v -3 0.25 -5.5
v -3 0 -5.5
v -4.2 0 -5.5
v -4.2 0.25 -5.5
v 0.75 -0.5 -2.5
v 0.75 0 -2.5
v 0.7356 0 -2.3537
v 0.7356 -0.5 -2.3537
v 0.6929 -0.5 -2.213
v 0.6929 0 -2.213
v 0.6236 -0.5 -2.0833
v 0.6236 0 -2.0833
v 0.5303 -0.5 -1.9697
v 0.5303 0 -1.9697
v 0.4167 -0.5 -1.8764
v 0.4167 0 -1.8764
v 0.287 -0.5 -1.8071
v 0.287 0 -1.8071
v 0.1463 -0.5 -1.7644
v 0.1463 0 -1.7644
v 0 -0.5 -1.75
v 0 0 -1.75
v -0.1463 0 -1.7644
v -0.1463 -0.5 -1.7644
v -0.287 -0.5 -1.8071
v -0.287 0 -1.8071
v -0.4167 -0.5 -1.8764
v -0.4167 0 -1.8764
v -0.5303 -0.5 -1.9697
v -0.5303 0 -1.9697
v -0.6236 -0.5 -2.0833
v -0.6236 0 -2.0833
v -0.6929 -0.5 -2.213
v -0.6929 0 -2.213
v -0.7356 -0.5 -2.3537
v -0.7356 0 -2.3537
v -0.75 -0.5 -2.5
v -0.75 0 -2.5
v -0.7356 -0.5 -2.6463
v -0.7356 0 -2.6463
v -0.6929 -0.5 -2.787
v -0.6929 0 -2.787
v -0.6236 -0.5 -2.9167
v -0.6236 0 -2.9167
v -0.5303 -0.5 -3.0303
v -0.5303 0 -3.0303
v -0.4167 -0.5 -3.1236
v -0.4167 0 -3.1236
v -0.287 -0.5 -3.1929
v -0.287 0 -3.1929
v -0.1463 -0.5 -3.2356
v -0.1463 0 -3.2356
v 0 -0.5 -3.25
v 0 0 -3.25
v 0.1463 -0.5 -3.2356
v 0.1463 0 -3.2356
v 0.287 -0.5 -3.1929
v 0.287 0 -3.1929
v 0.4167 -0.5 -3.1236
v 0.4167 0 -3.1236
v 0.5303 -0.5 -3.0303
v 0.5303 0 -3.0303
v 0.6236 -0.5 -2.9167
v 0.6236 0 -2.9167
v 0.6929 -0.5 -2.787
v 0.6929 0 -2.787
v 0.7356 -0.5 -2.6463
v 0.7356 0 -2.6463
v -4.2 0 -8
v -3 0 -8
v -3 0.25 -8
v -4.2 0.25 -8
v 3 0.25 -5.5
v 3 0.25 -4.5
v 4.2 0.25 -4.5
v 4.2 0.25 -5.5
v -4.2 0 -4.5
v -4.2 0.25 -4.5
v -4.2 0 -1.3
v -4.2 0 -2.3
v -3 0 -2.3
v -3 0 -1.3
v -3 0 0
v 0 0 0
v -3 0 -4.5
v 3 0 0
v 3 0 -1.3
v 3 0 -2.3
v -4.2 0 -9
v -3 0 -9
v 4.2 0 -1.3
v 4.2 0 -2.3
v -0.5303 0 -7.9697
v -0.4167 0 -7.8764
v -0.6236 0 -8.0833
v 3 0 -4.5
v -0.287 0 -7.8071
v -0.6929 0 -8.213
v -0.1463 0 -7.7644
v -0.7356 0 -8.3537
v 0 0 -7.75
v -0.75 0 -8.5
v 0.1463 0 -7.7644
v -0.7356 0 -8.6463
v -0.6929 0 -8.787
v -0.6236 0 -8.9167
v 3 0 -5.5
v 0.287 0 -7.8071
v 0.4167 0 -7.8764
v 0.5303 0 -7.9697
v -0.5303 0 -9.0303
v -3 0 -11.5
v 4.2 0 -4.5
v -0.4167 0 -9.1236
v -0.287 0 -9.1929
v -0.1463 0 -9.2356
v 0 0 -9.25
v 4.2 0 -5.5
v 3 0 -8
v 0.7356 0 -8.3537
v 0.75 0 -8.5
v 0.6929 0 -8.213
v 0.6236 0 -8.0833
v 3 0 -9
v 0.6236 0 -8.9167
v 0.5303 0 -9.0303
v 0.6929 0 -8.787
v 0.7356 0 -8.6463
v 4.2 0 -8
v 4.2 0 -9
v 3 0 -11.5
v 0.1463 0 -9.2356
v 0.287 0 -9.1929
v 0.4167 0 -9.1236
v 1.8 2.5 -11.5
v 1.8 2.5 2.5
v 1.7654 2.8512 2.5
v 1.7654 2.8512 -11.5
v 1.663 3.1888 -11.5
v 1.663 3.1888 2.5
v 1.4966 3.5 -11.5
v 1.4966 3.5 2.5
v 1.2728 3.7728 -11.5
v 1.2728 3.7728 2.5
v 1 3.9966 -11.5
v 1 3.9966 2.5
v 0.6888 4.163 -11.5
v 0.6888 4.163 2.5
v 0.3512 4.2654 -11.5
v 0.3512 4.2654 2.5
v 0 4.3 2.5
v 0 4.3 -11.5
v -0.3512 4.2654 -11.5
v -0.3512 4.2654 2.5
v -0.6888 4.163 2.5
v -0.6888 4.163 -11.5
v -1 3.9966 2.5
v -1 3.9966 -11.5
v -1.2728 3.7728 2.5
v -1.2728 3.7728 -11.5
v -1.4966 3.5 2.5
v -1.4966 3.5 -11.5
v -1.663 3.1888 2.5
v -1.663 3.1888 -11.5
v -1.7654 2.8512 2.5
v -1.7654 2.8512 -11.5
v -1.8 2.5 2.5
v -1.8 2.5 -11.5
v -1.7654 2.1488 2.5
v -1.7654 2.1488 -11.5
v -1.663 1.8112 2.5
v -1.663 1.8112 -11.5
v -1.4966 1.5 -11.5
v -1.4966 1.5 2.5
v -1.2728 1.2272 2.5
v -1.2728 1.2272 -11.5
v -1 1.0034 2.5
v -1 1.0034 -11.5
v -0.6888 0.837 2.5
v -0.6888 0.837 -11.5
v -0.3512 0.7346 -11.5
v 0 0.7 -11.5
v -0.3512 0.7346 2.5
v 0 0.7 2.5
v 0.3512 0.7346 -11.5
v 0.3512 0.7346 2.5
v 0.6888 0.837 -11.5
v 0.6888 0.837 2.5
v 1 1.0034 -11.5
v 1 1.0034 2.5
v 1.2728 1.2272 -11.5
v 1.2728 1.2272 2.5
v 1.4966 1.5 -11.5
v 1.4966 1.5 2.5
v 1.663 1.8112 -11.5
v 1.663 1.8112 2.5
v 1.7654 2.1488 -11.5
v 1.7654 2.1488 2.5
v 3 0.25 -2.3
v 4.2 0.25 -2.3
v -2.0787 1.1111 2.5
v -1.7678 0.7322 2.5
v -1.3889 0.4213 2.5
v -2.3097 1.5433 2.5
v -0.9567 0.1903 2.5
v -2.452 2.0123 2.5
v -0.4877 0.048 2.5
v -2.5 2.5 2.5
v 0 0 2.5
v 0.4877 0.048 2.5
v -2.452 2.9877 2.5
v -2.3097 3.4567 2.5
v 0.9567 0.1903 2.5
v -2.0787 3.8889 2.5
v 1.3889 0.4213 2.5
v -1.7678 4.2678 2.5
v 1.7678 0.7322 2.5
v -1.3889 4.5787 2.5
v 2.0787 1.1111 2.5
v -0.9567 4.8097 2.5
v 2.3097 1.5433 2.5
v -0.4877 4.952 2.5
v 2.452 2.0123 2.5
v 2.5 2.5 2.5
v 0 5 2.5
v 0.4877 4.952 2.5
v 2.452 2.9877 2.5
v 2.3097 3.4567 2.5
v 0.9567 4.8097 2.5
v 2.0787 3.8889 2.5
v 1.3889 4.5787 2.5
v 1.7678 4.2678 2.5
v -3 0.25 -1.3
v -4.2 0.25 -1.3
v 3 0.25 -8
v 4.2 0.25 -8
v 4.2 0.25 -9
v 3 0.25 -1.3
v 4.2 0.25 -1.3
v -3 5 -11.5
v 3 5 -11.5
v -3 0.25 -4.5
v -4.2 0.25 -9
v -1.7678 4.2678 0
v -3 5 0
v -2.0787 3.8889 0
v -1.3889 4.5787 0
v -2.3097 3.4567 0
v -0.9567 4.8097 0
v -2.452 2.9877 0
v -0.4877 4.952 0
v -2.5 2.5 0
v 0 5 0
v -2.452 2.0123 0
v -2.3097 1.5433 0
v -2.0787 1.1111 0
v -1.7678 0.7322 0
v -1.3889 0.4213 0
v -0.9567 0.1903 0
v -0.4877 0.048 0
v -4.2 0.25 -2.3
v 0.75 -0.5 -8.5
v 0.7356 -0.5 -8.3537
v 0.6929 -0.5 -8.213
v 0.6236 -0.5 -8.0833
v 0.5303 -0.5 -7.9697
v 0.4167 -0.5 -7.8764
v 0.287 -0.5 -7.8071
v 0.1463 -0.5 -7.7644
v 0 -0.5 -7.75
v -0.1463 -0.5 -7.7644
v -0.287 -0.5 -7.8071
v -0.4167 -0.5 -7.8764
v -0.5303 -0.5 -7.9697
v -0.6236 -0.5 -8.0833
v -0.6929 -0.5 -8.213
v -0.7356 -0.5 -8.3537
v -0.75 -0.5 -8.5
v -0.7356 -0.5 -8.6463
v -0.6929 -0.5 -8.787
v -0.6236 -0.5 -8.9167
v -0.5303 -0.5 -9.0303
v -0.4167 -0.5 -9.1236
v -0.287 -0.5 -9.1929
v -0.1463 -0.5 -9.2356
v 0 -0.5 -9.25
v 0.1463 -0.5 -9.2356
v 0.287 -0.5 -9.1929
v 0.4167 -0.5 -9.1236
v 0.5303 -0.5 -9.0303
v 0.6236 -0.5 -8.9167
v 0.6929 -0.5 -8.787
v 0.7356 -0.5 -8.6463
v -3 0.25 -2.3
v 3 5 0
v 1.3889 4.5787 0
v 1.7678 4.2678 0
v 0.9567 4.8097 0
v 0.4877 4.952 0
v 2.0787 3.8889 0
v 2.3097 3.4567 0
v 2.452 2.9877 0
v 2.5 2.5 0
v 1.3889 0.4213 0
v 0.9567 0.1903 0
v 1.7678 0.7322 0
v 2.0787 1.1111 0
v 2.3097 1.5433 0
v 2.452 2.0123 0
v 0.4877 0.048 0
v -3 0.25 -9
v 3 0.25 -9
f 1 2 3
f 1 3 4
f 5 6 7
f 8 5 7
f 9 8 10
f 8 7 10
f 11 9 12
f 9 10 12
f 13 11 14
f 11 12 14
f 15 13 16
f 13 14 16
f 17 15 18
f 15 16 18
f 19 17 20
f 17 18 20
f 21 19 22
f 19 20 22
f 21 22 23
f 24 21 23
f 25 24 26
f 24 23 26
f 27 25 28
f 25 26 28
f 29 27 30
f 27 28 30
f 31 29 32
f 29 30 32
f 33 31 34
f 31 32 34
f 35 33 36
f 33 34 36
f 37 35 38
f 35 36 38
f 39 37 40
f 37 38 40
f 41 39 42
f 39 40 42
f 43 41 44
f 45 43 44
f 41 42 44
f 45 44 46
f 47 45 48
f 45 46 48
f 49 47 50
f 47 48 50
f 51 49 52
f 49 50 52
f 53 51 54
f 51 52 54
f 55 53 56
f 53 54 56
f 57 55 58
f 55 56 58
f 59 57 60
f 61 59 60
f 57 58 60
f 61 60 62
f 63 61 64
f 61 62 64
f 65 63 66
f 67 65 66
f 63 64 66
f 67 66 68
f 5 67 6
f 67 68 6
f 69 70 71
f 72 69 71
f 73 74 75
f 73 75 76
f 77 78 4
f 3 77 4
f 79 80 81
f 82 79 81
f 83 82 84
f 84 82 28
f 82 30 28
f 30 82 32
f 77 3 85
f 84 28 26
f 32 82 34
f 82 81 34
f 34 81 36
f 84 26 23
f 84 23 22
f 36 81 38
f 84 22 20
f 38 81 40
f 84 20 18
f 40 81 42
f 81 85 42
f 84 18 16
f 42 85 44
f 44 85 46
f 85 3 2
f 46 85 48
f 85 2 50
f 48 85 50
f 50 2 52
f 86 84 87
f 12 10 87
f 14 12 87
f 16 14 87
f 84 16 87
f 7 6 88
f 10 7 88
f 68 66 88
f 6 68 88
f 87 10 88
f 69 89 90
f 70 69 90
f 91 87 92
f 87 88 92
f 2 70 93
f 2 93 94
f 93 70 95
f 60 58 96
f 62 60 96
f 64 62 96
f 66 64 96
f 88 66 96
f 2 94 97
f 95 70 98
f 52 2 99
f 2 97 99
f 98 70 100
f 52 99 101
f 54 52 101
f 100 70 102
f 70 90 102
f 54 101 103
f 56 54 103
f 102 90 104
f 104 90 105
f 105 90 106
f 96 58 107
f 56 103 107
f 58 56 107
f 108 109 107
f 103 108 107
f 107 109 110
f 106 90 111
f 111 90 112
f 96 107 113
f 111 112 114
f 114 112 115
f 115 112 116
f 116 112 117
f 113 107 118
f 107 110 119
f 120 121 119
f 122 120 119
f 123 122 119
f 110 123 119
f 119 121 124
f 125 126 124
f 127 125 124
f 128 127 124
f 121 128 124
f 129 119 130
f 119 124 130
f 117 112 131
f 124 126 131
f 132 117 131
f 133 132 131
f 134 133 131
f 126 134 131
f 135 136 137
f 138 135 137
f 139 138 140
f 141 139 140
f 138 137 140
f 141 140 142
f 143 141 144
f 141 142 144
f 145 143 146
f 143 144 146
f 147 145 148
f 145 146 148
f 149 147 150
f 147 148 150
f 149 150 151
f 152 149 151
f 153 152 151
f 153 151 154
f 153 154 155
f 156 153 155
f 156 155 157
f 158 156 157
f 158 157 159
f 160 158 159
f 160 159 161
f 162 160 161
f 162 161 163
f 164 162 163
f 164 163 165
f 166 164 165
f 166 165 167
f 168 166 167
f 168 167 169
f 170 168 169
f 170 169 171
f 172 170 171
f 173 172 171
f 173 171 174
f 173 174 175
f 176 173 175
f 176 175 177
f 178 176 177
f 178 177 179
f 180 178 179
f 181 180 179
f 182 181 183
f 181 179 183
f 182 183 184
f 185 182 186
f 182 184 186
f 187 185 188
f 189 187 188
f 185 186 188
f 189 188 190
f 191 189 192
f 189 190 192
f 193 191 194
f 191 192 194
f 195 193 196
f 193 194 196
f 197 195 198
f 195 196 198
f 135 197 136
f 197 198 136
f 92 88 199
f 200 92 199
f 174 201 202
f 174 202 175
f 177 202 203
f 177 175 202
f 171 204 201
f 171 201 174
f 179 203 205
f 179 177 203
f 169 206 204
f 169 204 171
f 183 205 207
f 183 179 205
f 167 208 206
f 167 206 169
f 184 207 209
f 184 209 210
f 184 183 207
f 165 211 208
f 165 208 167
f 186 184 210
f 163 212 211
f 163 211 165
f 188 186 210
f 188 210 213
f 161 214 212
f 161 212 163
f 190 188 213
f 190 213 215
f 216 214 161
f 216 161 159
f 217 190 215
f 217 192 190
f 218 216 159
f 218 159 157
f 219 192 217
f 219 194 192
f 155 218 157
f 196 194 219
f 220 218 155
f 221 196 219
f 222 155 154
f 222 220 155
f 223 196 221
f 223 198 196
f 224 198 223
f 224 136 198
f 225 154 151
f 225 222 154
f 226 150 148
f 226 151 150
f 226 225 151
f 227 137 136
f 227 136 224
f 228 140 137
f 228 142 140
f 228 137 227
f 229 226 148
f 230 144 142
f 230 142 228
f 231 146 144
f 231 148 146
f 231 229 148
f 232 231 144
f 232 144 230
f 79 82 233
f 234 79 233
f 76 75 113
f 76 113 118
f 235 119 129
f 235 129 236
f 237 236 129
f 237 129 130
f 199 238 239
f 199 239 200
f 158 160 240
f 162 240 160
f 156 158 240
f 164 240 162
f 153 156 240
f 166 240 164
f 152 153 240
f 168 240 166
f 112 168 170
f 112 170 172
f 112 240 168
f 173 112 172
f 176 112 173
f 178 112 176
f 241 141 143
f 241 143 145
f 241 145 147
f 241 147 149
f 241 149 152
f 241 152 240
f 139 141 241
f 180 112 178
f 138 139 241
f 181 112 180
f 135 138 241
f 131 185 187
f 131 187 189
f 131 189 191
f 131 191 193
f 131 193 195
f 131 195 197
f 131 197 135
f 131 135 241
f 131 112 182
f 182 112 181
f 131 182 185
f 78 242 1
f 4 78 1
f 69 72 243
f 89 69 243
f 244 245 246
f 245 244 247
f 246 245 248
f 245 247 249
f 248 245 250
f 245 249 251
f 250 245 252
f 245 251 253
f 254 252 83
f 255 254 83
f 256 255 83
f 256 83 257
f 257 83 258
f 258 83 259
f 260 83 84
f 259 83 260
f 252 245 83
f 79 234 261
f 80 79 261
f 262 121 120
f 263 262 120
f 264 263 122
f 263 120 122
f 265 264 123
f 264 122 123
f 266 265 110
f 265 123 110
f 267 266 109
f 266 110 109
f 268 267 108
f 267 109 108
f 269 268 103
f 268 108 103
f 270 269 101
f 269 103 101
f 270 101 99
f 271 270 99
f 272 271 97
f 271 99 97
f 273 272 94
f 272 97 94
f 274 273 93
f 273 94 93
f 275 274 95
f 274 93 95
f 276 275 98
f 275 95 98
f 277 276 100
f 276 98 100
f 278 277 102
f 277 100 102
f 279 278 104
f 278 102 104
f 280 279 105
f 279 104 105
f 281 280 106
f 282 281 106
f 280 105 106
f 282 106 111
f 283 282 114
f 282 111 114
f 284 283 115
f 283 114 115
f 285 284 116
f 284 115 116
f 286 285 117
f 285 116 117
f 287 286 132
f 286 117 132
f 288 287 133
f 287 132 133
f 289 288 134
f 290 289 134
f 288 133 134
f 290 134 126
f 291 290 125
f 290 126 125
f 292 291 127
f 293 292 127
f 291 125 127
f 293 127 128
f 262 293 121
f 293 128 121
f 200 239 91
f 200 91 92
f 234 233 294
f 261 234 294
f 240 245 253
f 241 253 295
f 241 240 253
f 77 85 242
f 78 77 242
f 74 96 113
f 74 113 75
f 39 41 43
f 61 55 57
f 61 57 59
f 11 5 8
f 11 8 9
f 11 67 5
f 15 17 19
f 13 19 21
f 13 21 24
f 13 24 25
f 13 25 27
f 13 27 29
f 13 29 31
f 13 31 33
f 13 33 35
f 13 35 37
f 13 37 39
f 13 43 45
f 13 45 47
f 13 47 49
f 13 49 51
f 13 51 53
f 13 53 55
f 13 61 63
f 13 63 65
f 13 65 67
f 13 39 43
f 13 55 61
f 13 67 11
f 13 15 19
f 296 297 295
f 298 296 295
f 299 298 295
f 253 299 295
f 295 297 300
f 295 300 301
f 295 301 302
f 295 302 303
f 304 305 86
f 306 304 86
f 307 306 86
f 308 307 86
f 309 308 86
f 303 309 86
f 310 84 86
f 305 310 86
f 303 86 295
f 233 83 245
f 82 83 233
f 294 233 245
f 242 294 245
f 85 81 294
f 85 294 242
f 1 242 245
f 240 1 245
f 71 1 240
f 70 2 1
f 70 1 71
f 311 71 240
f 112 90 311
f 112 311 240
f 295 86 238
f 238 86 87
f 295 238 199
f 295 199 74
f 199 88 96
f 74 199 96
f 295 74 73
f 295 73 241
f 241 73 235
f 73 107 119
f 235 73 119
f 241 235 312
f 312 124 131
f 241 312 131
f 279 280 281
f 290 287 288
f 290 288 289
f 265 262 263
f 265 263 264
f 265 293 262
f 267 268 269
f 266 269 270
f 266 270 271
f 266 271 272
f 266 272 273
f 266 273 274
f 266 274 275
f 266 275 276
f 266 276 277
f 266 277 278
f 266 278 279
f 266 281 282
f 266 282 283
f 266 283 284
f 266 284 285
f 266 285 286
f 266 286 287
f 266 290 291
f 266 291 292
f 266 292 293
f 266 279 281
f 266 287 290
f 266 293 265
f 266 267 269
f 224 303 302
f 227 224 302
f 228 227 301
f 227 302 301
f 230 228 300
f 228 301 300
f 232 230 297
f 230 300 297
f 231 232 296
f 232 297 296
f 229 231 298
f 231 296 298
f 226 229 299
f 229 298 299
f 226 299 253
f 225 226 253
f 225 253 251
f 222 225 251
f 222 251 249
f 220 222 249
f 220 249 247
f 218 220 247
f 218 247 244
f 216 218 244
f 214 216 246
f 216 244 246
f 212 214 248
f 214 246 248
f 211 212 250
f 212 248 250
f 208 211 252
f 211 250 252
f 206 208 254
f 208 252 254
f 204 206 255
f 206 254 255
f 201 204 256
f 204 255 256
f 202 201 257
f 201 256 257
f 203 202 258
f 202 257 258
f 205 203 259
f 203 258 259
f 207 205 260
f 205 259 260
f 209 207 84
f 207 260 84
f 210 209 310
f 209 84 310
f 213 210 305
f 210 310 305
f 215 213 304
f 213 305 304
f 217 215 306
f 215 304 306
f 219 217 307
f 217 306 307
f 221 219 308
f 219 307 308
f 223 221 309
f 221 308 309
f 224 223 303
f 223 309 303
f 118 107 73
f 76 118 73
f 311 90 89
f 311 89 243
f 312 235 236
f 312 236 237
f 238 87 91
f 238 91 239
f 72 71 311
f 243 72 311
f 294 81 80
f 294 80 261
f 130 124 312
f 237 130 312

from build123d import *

# Parameters (mm, degrees)
SKETCH_1_W          = 6
SKETCH_1_H          = 11.5
EXTRUDE_1_DEPTH     = 5
SKETCH_2_R          = 2.5
EXTRUDE_2_DEPTH     = 2.5
SKETCH_3_R          = 0.75
EXTRUDE_3_DEPTH     = 0.5
SKETCH_4_W          = 1
SKETCH_4_H          = 0.25
EXTRUDE_4_DEPTH     = 1.2
SKETCH_5_R          = 1.8
CUT_EXTRUDE_1_DEPTH = 15


with BuildPart() as part:
    # 草图1 → 凸台-拉伸1 (new body)
    with BuildSketch(Plane(origin=(0, 0, 0), x_dir=(1, 0, 0), z_dir=(0, 1, 0))):
        with Locations((0, 5.75)):
            Rectangle(SKETCH_1_W, SKETCH_1_H)
    extrude(amount=EXTRUDE_1_DEPTH)

    # 草图2 → 凸台-拉伸2 (add)
    with BuildSketch(Plane.XY):
        with Locations((0, 2.5)):
            Circle(SKETCH_2_R)
    extrude(amount=EXTRUDE_2_DEPTH)

    # 草图3 → 凸台-拉伸3 (add)
    with BuildSketch(Plane.XZ):
        with Locations((0, -2.5)):
            Circle(SKETCH_3_R)
        with Locations((0, -8.5)):
            Circle(SKETCH_3_R)
    extrude(amount=EXTRUDE_3_DEPTH)

    # 草图4 → 凸台-拉伸4 (add)
    with BuildSketch(Plane(origin=(3, 0, 0), x_dir=(0, 0, -1), z_dir=(1, 0, 0))):
        with Locations((1.8, 0.125)):
            Rectangle(SKETCH_4_W, SKETCH_4_H)
        with Locations((5, 0.125)):
            Rectangle(SKETCH_4_W, SKETCH_4_H)
        with Locations((8.5, 0.125)):
            Rectangle(SKETCH_4_W, SKETCH_4_H)
    extrude_4 = extrude(amount=EXTRUDE_4_DEPTH)

    # 镜向1: 凸台-拉伸4 across plane
    add(extrude_4.mirror(Plane(origin=(0, 0, 0), x_dir=(0, 0, 1), z_dir=(1, 0, 0))))

    # 草图5 → 切除-拉伸1 (cut, through all)
    with BuildSketch(Plane.XY.offset(2.5)):
        with Locations((0, 2.5)):
            Circle(SKETCH_5_R)
    extrude(amount=-CUT_EXTRUDE_1_DEPTH, mode=Mode.SUBTRACT)


solid = part.part
